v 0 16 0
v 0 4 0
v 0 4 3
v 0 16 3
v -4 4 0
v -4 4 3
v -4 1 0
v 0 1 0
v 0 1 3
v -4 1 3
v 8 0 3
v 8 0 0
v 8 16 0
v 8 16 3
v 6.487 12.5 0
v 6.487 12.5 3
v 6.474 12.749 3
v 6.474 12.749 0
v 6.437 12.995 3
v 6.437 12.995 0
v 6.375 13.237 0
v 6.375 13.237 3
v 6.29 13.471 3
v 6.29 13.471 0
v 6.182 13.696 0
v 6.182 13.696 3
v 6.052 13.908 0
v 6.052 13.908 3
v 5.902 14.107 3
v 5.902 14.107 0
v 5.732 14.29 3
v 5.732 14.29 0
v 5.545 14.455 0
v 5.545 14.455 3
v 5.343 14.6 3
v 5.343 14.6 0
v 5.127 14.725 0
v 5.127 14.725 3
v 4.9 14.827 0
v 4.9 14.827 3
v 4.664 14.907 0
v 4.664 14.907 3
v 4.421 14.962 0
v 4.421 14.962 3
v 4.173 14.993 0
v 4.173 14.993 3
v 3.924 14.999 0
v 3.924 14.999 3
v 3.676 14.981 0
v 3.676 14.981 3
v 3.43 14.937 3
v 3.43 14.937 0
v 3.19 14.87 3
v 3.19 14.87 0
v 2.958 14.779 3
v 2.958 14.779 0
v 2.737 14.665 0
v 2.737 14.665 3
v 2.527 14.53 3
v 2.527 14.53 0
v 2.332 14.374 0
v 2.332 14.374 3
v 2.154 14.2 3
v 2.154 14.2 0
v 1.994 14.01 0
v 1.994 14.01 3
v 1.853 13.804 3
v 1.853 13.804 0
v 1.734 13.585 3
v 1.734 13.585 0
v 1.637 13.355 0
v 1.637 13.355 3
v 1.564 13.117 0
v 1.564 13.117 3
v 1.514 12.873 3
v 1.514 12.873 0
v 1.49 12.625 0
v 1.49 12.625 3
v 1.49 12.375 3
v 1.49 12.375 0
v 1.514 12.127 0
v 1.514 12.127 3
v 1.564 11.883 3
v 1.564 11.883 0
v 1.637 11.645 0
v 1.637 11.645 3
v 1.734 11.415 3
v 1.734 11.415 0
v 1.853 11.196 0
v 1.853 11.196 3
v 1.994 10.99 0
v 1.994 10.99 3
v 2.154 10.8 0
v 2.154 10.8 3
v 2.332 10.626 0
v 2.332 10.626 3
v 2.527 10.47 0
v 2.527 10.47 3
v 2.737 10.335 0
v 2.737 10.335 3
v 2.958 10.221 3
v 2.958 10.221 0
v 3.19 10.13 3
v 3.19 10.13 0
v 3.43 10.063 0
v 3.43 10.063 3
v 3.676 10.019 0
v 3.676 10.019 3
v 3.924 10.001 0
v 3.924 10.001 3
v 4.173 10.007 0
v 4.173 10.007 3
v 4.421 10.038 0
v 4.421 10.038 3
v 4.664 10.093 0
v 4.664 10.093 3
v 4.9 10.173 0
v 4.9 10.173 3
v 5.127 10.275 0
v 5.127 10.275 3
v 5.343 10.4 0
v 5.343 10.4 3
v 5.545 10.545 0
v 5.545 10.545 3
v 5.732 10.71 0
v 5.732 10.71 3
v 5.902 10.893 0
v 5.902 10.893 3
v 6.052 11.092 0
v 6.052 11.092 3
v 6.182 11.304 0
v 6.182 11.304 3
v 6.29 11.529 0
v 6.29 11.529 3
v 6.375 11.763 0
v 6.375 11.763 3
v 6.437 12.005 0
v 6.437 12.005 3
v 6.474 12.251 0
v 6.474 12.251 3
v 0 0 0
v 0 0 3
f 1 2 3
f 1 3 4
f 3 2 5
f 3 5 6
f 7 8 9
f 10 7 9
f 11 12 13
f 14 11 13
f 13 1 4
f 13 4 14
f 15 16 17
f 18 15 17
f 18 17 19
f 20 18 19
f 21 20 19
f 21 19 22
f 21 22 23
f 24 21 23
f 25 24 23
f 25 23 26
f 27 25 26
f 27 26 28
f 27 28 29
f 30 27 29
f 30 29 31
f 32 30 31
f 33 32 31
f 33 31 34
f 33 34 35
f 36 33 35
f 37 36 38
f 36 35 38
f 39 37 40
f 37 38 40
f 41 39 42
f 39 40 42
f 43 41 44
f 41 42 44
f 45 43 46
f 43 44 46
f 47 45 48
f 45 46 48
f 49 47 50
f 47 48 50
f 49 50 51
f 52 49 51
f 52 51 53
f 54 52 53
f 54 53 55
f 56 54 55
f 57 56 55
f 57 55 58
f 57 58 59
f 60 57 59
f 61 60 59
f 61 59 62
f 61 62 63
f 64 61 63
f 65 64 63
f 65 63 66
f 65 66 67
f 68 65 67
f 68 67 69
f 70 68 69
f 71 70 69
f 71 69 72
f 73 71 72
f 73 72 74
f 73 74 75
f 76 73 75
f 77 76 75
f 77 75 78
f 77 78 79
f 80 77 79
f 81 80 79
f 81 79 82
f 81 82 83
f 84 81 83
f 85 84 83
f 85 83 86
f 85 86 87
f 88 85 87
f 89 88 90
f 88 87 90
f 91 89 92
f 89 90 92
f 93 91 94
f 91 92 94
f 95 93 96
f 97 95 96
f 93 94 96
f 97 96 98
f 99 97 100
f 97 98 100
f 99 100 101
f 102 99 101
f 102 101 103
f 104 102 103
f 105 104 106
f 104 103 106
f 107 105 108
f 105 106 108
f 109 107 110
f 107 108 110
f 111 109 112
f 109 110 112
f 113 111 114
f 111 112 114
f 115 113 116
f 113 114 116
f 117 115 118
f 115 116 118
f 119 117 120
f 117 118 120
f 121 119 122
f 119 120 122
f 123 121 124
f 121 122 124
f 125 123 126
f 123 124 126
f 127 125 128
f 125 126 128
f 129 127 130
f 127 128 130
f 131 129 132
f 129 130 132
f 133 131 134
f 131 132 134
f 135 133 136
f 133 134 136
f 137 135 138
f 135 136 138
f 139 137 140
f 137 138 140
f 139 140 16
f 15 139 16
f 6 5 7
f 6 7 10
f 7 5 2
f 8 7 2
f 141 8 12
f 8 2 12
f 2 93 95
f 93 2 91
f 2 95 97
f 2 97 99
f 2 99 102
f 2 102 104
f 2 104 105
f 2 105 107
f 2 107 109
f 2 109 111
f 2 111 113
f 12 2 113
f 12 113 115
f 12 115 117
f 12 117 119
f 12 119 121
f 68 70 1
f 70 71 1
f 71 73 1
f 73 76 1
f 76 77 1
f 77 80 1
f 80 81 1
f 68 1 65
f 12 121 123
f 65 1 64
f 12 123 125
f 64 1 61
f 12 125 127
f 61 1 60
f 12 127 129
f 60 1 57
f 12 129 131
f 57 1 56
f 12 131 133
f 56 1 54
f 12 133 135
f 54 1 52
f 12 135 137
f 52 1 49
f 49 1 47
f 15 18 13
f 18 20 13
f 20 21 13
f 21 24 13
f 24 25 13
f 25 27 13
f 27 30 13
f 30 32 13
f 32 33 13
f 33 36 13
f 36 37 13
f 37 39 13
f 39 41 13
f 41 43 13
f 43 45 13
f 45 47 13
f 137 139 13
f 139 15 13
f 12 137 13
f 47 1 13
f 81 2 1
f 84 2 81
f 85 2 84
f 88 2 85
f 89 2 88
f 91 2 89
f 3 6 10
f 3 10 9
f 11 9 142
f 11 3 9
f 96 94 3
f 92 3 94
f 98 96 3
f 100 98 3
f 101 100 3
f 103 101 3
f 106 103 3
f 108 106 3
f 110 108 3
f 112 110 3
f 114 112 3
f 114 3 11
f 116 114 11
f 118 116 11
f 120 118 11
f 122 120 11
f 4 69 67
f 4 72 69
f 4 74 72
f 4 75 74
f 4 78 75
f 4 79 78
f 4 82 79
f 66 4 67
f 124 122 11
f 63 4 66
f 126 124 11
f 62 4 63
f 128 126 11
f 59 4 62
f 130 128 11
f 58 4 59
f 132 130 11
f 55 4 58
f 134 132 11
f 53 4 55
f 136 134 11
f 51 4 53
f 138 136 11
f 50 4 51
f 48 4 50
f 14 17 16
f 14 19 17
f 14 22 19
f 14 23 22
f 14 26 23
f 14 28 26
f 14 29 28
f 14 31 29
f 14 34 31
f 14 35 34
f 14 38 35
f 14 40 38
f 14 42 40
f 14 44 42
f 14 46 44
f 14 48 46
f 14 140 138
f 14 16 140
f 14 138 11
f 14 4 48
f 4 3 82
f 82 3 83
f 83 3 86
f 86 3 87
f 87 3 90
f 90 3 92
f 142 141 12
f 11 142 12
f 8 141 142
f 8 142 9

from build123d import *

# Parameters (mm, degrees)
SKETCH1_W           = 8
SKETCH1_H           = 16
BOSS_EXTRUDE1_DEPTH = 3
SKETCH3_R           = 2.5
CUT_EXTRUDE1_DEPTH  = 10
SKETCH2_W           = 3
SKETCH2_H           = 3
BOSS_EXTRUDE3_DEPTH = 4


with BuildPart() as part:
    # Sketch1 → Boss-Extrude1 (new body)
    with BuildSketch(Plane.XY):
        with Locations((4, 8)):
            Rectangle(SKETCH1_W, SKETCH1_H)
    extrude(amount=BOSS_EXTRUDE1_DEPTH)

    # Sketch3 → Cut-Extrude1 (cut)
    with BuildSketch(Plane.XY.offset(3)):
        with Locations((3.98651131, 12.5)):
            Circle(SKETCH3_R)
    extrude(amount=-CUT_EXTRUDE1_DEPTH, mode=Mode.SUBTRACT)

    # Sketch2 → Boss-Extrude3 (add)
    with BuildSketch(Plane.ZY):
        with Locations((1.5, 2.5)):
            Rectangle(SKETCH2_W, SKETCH2_H)
    extrude(amount=BOSS_EXTRUDE3_DEPTH)


solid = part.part
